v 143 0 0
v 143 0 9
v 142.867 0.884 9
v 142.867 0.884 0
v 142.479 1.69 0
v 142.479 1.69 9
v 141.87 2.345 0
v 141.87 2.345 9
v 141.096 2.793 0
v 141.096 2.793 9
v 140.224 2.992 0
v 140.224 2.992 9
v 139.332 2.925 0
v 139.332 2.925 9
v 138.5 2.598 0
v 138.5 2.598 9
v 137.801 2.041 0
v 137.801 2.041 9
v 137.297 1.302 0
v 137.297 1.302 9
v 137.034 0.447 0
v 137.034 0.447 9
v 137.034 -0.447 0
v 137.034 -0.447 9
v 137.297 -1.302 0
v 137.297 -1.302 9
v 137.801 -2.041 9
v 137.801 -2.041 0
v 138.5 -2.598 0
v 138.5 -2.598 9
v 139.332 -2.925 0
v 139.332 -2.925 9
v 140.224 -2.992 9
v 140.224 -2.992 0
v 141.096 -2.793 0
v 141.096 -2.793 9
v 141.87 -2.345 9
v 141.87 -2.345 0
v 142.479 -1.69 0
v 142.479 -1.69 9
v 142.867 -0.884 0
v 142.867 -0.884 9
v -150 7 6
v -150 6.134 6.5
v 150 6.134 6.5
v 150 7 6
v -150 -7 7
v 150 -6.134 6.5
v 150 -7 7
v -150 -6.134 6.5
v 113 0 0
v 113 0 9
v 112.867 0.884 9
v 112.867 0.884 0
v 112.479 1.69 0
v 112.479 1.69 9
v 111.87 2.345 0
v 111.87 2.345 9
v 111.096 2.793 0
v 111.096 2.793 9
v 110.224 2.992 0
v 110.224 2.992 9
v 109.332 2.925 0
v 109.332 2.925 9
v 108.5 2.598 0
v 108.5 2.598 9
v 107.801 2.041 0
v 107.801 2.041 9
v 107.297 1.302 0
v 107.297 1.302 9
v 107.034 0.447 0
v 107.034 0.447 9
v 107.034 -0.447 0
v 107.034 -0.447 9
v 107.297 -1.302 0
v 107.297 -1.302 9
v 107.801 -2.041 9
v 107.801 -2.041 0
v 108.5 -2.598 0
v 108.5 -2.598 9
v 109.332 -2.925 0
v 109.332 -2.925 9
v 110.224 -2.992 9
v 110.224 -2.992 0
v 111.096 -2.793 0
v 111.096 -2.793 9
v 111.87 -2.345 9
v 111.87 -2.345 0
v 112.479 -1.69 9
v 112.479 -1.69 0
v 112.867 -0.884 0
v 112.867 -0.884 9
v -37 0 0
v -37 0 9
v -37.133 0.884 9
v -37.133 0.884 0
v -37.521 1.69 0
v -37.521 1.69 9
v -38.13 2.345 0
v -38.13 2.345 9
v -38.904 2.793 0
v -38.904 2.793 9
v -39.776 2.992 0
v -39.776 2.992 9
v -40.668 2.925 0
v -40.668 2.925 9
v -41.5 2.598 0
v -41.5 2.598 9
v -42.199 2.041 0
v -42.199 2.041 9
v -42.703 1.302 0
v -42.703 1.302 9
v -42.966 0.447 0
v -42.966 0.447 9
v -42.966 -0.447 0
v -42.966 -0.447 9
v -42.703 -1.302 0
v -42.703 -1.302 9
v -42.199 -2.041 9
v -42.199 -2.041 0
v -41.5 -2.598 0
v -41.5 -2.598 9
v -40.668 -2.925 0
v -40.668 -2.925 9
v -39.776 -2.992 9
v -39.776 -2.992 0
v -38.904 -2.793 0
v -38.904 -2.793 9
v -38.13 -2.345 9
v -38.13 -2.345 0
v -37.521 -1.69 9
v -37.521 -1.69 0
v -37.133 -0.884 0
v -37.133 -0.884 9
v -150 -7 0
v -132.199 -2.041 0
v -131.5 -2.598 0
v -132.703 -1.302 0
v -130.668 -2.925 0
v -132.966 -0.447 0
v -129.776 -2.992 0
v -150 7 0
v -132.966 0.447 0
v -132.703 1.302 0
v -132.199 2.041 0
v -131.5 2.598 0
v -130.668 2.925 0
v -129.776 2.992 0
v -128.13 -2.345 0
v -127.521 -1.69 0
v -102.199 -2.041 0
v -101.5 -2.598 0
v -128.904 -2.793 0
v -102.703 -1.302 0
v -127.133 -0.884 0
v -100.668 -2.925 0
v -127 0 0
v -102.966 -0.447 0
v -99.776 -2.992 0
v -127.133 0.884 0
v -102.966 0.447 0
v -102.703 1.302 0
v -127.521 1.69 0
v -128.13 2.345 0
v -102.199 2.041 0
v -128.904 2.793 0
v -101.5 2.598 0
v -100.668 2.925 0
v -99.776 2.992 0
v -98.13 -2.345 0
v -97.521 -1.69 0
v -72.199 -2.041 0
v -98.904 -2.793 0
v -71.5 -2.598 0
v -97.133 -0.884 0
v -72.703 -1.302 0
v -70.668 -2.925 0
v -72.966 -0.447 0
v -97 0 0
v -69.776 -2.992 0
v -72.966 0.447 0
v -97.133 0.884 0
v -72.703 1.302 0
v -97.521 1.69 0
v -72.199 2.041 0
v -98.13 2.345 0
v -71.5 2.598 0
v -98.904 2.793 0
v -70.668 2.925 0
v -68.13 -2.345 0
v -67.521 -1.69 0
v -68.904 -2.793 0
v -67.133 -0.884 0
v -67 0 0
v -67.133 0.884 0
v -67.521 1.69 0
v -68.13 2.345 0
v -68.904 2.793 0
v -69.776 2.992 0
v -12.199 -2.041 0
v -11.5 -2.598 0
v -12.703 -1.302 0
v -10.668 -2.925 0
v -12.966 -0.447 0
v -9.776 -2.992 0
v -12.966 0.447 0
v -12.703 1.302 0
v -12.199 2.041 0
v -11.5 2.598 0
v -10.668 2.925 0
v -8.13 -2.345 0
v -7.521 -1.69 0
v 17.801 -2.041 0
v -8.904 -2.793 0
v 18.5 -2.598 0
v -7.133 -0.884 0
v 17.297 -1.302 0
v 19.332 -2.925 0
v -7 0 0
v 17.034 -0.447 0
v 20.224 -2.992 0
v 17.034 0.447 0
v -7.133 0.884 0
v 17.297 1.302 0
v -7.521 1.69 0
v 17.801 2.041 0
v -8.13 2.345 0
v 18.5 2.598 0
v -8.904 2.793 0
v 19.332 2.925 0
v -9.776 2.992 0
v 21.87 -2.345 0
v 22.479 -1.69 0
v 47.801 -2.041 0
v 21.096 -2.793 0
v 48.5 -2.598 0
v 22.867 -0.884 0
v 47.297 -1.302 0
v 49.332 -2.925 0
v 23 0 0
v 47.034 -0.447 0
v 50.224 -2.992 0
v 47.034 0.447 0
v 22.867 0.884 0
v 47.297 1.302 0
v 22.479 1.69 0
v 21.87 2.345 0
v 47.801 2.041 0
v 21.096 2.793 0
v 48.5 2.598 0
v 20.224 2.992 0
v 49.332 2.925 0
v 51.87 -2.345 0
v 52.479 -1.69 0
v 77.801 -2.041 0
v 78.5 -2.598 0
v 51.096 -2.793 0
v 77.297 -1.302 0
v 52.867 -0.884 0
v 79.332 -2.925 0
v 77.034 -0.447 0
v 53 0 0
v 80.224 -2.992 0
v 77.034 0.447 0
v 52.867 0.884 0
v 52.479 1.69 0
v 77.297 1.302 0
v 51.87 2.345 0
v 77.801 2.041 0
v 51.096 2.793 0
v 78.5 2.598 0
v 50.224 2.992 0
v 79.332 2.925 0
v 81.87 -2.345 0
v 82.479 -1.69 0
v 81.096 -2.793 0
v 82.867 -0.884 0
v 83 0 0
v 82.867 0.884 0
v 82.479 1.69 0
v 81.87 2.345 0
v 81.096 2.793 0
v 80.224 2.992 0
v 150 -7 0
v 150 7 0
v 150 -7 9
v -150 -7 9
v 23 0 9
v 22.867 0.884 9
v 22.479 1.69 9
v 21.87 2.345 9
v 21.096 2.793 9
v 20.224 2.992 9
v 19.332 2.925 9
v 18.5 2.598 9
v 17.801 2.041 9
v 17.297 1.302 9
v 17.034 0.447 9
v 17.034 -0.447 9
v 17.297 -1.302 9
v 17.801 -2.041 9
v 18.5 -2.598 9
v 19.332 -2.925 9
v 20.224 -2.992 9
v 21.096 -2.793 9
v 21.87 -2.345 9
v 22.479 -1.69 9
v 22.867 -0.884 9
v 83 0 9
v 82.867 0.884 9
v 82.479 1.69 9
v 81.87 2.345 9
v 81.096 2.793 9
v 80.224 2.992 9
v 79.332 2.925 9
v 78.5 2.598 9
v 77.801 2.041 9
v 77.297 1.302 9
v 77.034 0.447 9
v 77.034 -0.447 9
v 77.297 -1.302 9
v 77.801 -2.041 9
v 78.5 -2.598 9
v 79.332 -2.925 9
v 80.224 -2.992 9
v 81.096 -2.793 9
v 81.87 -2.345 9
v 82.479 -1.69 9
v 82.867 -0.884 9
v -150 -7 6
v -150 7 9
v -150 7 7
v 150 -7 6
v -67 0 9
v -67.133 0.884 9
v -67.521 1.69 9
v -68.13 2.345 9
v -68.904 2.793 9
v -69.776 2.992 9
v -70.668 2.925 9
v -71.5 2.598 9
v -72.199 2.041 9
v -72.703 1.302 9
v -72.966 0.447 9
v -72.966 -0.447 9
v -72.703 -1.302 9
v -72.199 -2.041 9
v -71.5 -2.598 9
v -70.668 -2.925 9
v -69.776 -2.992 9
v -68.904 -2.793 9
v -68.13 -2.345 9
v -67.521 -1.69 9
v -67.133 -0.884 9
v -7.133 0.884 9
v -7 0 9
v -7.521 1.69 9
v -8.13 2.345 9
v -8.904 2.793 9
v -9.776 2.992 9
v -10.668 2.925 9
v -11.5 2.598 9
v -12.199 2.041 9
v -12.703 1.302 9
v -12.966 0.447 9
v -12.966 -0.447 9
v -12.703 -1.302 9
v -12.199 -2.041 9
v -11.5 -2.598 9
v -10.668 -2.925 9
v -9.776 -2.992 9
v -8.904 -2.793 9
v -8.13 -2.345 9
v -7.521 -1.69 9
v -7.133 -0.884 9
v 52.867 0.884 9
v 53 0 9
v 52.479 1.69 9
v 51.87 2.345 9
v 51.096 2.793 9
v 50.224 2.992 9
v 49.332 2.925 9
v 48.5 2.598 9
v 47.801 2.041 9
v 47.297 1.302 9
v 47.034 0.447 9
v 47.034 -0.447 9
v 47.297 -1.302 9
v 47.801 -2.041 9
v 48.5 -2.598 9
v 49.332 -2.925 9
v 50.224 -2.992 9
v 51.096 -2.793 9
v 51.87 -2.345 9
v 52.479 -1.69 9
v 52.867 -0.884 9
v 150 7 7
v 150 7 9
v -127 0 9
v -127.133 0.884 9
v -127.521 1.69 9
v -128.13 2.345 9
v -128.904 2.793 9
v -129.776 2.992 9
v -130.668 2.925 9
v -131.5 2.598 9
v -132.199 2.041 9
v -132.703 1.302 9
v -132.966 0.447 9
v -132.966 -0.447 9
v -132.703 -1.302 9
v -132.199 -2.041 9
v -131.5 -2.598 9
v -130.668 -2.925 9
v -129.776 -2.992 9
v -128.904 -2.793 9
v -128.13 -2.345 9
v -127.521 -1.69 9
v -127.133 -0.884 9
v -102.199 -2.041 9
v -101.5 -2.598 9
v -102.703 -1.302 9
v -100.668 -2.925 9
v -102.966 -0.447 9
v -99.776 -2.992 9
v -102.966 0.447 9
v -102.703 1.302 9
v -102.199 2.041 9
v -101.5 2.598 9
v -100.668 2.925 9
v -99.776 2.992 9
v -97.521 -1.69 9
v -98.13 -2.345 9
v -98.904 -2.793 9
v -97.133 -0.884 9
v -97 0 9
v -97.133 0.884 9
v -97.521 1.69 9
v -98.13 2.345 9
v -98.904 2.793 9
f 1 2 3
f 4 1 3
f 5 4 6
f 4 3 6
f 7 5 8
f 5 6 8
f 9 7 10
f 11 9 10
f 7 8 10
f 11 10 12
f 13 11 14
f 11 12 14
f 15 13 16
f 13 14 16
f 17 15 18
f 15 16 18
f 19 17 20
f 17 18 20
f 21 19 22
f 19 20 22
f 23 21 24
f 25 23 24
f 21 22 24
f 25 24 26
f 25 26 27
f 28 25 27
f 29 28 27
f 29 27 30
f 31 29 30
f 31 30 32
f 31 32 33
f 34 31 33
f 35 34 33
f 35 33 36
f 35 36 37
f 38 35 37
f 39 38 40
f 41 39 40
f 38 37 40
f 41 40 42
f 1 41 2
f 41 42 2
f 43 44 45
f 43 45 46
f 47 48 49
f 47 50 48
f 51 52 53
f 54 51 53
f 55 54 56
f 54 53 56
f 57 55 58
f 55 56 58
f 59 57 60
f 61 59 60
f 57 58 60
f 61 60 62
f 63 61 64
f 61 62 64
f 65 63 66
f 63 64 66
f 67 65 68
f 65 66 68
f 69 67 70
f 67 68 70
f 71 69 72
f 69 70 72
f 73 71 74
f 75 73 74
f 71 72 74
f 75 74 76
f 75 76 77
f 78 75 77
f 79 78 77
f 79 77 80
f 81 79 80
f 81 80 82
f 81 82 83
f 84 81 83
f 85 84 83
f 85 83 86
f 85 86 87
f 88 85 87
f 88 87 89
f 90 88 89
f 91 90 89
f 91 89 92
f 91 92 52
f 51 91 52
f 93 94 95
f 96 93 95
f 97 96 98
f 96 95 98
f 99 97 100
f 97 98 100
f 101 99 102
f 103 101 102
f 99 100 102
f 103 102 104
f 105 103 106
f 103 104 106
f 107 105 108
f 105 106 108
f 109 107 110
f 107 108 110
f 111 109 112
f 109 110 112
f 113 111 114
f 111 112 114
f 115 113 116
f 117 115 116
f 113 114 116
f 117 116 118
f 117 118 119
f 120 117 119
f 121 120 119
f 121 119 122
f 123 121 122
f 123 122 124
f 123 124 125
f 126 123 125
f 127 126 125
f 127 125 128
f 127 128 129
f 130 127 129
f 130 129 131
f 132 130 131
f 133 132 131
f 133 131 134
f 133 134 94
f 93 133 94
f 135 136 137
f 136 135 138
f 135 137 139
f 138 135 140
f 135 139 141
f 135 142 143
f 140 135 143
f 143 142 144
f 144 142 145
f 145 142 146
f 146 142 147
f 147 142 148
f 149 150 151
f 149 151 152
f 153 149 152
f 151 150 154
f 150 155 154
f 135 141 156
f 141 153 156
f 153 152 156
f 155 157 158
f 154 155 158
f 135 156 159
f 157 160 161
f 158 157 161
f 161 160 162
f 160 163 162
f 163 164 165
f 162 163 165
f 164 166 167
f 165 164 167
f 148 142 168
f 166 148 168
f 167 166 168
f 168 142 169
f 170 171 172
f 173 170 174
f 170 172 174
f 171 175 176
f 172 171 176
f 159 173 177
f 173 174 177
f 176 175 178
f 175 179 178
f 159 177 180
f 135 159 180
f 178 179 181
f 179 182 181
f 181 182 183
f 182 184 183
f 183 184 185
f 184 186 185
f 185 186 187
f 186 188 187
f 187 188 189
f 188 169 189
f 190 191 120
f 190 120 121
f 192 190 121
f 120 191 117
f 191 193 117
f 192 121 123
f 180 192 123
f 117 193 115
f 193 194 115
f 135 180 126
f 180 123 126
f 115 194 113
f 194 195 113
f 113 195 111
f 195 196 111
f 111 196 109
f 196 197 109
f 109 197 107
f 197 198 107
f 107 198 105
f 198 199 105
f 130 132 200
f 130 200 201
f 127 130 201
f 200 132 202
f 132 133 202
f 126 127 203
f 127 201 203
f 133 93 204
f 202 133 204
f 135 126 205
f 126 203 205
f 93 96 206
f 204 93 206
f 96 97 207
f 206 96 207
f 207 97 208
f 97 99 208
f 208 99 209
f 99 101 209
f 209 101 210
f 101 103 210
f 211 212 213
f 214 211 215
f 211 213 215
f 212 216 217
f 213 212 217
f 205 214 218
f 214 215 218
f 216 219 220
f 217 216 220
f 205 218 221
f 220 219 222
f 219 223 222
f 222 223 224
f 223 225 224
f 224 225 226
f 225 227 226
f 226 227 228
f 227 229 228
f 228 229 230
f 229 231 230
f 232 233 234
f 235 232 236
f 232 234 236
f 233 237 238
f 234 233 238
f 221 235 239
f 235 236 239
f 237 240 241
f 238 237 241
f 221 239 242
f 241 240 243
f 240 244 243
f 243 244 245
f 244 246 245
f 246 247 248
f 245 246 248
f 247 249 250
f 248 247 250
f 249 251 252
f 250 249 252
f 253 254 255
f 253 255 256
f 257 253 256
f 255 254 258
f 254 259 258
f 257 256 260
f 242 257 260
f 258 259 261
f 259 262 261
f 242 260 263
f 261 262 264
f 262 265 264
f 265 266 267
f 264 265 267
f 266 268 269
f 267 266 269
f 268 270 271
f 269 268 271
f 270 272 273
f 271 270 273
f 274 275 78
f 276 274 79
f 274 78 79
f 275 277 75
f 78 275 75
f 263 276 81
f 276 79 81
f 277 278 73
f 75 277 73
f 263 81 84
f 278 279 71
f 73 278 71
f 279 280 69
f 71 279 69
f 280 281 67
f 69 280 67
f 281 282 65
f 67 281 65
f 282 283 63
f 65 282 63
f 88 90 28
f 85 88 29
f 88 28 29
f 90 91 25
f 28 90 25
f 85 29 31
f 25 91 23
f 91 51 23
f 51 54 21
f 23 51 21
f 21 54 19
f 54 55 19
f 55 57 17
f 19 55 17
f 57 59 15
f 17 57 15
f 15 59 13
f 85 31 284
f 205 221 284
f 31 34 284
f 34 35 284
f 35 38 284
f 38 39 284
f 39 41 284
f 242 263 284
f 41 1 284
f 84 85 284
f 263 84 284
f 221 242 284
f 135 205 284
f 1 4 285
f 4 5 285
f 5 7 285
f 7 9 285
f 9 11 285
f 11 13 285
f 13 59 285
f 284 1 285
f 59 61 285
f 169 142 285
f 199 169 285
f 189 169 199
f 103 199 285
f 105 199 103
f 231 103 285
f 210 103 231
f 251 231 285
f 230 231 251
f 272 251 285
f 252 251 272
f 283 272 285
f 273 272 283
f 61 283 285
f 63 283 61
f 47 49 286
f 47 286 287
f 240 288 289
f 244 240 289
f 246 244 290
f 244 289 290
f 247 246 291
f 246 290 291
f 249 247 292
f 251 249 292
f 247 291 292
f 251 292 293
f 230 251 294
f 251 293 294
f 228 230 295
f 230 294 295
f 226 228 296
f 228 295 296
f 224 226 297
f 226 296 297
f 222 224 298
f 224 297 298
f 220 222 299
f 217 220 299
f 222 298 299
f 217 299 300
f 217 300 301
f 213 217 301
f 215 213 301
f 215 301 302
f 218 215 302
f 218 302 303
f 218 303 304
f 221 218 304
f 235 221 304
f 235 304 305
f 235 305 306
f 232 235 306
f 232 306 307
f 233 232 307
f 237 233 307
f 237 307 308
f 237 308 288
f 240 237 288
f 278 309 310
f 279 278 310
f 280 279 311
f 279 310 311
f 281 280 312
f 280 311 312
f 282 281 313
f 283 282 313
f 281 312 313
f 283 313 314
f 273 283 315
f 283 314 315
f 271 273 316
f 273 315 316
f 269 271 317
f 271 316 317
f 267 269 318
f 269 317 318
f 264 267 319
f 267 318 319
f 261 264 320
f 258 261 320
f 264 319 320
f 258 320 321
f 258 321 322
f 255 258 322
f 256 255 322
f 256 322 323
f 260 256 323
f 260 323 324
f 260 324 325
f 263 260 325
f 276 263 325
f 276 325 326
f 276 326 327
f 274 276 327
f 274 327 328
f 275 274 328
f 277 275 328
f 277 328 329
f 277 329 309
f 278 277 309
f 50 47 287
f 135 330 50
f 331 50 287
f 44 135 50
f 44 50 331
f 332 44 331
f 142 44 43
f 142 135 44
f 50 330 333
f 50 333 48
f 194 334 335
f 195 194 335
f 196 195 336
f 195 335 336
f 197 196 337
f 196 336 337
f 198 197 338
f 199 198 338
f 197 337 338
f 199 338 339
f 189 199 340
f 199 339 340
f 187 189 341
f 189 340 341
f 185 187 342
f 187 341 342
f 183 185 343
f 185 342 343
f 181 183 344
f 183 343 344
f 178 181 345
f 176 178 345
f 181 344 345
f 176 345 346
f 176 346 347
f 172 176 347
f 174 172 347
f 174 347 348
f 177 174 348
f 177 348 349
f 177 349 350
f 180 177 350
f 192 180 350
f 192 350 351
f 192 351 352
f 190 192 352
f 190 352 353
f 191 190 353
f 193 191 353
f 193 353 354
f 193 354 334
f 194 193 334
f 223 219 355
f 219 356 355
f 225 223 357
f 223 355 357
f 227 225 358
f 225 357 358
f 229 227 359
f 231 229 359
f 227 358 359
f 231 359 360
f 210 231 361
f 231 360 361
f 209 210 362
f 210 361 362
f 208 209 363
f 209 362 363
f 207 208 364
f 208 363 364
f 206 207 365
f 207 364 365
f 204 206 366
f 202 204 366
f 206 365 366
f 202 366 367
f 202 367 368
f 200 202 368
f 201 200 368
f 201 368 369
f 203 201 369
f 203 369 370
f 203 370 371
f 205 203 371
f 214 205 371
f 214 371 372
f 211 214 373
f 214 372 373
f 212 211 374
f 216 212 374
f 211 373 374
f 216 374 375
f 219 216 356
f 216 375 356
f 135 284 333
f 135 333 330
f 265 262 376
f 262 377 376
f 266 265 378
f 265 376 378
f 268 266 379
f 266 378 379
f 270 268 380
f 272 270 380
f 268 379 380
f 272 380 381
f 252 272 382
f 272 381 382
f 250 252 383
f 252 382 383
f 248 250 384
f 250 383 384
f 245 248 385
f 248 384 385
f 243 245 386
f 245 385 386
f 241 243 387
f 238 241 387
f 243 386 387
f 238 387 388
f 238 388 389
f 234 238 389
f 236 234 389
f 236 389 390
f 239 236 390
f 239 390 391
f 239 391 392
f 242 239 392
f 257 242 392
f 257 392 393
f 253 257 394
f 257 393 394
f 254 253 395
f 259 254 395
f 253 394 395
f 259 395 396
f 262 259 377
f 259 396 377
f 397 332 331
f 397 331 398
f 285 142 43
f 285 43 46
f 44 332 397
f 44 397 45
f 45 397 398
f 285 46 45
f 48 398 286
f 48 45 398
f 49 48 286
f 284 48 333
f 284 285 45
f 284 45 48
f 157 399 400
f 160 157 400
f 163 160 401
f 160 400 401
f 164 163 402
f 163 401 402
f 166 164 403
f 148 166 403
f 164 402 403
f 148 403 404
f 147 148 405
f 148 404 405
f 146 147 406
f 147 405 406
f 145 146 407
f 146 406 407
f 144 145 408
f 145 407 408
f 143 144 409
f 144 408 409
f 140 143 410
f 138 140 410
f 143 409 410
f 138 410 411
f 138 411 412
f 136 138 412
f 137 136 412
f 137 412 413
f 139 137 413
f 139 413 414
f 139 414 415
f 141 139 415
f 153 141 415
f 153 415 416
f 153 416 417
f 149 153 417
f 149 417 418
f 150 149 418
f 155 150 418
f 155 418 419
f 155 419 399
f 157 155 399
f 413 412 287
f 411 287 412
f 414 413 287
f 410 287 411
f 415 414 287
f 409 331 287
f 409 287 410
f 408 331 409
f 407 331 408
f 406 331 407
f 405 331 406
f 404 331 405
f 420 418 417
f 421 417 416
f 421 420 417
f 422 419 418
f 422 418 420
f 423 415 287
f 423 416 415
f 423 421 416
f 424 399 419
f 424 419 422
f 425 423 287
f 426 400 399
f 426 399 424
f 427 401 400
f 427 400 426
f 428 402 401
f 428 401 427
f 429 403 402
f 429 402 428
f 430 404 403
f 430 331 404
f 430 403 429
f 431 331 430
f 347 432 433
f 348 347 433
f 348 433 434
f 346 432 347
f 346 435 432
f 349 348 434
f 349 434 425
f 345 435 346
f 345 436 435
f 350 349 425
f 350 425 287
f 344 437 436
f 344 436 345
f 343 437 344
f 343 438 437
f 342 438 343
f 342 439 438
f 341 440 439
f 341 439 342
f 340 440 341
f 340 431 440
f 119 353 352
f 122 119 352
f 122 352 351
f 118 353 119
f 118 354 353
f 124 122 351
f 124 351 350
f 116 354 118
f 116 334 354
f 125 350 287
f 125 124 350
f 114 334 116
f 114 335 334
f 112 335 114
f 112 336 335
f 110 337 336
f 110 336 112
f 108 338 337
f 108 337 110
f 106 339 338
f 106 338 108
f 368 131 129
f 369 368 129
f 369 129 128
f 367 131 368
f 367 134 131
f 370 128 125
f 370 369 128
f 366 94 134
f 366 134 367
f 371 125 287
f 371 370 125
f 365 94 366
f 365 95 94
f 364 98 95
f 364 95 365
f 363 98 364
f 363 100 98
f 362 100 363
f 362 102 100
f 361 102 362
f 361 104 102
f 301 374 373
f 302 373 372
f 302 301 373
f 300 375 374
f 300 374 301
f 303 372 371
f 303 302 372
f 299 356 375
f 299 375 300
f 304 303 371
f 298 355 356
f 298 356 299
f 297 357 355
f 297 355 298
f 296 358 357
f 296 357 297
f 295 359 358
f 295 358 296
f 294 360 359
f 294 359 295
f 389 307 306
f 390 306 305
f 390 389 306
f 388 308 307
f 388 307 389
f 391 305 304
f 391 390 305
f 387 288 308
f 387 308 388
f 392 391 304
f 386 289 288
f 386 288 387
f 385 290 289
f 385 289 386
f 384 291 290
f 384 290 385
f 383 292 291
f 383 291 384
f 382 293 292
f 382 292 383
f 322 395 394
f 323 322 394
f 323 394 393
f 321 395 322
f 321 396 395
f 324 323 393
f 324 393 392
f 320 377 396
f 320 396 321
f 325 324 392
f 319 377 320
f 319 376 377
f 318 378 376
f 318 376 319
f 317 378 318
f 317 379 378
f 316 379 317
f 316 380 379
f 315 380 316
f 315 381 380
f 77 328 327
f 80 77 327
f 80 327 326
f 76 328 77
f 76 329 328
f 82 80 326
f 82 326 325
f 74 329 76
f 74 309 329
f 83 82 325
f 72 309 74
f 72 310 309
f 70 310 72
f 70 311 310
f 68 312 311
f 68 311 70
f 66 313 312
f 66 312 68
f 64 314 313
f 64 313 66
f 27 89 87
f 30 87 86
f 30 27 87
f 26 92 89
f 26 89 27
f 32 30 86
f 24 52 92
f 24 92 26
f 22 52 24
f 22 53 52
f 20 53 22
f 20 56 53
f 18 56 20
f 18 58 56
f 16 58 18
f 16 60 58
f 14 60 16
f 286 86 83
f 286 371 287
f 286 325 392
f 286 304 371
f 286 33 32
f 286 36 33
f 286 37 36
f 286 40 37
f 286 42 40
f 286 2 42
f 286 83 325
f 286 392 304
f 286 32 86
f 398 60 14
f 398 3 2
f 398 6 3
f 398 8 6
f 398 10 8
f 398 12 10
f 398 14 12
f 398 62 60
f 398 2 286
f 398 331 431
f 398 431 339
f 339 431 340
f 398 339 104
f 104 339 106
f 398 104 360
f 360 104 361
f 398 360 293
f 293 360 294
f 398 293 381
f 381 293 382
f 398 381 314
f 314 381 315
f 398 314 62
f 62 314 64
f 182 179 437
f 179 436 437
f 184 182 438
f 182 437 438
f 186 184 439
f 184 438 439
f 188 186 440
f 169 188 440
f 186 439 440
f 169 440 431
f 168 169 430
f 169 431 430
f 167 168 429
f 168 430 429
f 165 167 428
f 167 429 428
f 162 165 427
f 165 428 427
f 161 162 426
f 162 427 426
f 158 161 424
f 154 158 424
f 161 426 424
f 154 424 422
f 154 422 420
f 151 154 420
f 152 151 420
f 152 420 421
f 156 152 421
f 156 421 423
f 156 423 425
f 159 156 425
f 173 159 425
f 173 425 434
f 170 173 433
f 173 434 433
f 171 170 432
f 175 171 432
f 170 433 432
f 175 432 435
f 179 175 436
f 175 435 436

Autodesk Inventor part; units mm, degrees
ref_plane "YZ Plane" through (0, 0, 0) normal (1, 0, 0) x (0, 1, 0)
ref_plane "XZ Plane" through (0, 0, 0) normal (0, 1, 0) x (-1, 0, 0)
ref_plane "XY Plane" through (0, 0, 0) normal (0, 0, 1) x (1, 0, 0)
sketch "Sketch1" plane through (0, 0, 0) normal (0, 0, 1) x (1, 0, 0)
  line L0 (150, -7) -> (-150, -7)
  line L1 (-150, -7) -> (-150, 7)
  line L2 (-150, 7) -> (150, 7)
  line L3 (150, 7) -> (150, -7)
  line L4 (0, 0) -> (0, 3.6651)
  line L5 (0, 0) -> (24.411, 0)
  point P0 (0, 7)
  point P1 (150, 0)
  dimension "d0" = 300
  dimension "d1" = 14
extrude "Extrusion1" add sketch "Sketch1" along normal blind 9
sketch "Sketch2" plane through (-150, -7, 0) normal (-1, 0, 0) x (0, 0, 1)
  line L0 (0, 14) -> (9, 14) projected
  line L1 (6.5, 13.134) -> (6, 14)
  line L2 (6, 14) -> (7, 14)
  line L3 (7, 14) -> (6.5, 13.134)
  point P0 (0, 7)
  point P1 (6.5, 13.7113)
  dimension "d4" = 1
  dimension "d5" = 2
extrude "Extrusion2" cut sketch "Sketch2" against normal through all
mirror "Mirror1" about plane through (0, 0, 0) normal (0, 1, 0) of "Extrusion2"
sketch "Sketch3" plane through (0, 0, 9) normal (0, 0, 1) x (1, 0, 0)
  line L0 (-150, 7) -> (-150, -7) projected
  circle A0 centre (-130, 0) radius 3
  point P0 (0, 0)
  dimension "d9" = 6
  dimension "d10" = 20
extrude "Extrusion3" cut sketch "Sketch3" against normal through all
pattern_linear "Rectangular Pattern1" count 10 spacing 30 along (1, 0, 0) of "Extrusion3"
ref_plane "Work Plane1" through (0, 0, 0) normal (0, 1, 0) x (-1, 0, 0)
properties part number "Stand" material "Steel, Wrought"
